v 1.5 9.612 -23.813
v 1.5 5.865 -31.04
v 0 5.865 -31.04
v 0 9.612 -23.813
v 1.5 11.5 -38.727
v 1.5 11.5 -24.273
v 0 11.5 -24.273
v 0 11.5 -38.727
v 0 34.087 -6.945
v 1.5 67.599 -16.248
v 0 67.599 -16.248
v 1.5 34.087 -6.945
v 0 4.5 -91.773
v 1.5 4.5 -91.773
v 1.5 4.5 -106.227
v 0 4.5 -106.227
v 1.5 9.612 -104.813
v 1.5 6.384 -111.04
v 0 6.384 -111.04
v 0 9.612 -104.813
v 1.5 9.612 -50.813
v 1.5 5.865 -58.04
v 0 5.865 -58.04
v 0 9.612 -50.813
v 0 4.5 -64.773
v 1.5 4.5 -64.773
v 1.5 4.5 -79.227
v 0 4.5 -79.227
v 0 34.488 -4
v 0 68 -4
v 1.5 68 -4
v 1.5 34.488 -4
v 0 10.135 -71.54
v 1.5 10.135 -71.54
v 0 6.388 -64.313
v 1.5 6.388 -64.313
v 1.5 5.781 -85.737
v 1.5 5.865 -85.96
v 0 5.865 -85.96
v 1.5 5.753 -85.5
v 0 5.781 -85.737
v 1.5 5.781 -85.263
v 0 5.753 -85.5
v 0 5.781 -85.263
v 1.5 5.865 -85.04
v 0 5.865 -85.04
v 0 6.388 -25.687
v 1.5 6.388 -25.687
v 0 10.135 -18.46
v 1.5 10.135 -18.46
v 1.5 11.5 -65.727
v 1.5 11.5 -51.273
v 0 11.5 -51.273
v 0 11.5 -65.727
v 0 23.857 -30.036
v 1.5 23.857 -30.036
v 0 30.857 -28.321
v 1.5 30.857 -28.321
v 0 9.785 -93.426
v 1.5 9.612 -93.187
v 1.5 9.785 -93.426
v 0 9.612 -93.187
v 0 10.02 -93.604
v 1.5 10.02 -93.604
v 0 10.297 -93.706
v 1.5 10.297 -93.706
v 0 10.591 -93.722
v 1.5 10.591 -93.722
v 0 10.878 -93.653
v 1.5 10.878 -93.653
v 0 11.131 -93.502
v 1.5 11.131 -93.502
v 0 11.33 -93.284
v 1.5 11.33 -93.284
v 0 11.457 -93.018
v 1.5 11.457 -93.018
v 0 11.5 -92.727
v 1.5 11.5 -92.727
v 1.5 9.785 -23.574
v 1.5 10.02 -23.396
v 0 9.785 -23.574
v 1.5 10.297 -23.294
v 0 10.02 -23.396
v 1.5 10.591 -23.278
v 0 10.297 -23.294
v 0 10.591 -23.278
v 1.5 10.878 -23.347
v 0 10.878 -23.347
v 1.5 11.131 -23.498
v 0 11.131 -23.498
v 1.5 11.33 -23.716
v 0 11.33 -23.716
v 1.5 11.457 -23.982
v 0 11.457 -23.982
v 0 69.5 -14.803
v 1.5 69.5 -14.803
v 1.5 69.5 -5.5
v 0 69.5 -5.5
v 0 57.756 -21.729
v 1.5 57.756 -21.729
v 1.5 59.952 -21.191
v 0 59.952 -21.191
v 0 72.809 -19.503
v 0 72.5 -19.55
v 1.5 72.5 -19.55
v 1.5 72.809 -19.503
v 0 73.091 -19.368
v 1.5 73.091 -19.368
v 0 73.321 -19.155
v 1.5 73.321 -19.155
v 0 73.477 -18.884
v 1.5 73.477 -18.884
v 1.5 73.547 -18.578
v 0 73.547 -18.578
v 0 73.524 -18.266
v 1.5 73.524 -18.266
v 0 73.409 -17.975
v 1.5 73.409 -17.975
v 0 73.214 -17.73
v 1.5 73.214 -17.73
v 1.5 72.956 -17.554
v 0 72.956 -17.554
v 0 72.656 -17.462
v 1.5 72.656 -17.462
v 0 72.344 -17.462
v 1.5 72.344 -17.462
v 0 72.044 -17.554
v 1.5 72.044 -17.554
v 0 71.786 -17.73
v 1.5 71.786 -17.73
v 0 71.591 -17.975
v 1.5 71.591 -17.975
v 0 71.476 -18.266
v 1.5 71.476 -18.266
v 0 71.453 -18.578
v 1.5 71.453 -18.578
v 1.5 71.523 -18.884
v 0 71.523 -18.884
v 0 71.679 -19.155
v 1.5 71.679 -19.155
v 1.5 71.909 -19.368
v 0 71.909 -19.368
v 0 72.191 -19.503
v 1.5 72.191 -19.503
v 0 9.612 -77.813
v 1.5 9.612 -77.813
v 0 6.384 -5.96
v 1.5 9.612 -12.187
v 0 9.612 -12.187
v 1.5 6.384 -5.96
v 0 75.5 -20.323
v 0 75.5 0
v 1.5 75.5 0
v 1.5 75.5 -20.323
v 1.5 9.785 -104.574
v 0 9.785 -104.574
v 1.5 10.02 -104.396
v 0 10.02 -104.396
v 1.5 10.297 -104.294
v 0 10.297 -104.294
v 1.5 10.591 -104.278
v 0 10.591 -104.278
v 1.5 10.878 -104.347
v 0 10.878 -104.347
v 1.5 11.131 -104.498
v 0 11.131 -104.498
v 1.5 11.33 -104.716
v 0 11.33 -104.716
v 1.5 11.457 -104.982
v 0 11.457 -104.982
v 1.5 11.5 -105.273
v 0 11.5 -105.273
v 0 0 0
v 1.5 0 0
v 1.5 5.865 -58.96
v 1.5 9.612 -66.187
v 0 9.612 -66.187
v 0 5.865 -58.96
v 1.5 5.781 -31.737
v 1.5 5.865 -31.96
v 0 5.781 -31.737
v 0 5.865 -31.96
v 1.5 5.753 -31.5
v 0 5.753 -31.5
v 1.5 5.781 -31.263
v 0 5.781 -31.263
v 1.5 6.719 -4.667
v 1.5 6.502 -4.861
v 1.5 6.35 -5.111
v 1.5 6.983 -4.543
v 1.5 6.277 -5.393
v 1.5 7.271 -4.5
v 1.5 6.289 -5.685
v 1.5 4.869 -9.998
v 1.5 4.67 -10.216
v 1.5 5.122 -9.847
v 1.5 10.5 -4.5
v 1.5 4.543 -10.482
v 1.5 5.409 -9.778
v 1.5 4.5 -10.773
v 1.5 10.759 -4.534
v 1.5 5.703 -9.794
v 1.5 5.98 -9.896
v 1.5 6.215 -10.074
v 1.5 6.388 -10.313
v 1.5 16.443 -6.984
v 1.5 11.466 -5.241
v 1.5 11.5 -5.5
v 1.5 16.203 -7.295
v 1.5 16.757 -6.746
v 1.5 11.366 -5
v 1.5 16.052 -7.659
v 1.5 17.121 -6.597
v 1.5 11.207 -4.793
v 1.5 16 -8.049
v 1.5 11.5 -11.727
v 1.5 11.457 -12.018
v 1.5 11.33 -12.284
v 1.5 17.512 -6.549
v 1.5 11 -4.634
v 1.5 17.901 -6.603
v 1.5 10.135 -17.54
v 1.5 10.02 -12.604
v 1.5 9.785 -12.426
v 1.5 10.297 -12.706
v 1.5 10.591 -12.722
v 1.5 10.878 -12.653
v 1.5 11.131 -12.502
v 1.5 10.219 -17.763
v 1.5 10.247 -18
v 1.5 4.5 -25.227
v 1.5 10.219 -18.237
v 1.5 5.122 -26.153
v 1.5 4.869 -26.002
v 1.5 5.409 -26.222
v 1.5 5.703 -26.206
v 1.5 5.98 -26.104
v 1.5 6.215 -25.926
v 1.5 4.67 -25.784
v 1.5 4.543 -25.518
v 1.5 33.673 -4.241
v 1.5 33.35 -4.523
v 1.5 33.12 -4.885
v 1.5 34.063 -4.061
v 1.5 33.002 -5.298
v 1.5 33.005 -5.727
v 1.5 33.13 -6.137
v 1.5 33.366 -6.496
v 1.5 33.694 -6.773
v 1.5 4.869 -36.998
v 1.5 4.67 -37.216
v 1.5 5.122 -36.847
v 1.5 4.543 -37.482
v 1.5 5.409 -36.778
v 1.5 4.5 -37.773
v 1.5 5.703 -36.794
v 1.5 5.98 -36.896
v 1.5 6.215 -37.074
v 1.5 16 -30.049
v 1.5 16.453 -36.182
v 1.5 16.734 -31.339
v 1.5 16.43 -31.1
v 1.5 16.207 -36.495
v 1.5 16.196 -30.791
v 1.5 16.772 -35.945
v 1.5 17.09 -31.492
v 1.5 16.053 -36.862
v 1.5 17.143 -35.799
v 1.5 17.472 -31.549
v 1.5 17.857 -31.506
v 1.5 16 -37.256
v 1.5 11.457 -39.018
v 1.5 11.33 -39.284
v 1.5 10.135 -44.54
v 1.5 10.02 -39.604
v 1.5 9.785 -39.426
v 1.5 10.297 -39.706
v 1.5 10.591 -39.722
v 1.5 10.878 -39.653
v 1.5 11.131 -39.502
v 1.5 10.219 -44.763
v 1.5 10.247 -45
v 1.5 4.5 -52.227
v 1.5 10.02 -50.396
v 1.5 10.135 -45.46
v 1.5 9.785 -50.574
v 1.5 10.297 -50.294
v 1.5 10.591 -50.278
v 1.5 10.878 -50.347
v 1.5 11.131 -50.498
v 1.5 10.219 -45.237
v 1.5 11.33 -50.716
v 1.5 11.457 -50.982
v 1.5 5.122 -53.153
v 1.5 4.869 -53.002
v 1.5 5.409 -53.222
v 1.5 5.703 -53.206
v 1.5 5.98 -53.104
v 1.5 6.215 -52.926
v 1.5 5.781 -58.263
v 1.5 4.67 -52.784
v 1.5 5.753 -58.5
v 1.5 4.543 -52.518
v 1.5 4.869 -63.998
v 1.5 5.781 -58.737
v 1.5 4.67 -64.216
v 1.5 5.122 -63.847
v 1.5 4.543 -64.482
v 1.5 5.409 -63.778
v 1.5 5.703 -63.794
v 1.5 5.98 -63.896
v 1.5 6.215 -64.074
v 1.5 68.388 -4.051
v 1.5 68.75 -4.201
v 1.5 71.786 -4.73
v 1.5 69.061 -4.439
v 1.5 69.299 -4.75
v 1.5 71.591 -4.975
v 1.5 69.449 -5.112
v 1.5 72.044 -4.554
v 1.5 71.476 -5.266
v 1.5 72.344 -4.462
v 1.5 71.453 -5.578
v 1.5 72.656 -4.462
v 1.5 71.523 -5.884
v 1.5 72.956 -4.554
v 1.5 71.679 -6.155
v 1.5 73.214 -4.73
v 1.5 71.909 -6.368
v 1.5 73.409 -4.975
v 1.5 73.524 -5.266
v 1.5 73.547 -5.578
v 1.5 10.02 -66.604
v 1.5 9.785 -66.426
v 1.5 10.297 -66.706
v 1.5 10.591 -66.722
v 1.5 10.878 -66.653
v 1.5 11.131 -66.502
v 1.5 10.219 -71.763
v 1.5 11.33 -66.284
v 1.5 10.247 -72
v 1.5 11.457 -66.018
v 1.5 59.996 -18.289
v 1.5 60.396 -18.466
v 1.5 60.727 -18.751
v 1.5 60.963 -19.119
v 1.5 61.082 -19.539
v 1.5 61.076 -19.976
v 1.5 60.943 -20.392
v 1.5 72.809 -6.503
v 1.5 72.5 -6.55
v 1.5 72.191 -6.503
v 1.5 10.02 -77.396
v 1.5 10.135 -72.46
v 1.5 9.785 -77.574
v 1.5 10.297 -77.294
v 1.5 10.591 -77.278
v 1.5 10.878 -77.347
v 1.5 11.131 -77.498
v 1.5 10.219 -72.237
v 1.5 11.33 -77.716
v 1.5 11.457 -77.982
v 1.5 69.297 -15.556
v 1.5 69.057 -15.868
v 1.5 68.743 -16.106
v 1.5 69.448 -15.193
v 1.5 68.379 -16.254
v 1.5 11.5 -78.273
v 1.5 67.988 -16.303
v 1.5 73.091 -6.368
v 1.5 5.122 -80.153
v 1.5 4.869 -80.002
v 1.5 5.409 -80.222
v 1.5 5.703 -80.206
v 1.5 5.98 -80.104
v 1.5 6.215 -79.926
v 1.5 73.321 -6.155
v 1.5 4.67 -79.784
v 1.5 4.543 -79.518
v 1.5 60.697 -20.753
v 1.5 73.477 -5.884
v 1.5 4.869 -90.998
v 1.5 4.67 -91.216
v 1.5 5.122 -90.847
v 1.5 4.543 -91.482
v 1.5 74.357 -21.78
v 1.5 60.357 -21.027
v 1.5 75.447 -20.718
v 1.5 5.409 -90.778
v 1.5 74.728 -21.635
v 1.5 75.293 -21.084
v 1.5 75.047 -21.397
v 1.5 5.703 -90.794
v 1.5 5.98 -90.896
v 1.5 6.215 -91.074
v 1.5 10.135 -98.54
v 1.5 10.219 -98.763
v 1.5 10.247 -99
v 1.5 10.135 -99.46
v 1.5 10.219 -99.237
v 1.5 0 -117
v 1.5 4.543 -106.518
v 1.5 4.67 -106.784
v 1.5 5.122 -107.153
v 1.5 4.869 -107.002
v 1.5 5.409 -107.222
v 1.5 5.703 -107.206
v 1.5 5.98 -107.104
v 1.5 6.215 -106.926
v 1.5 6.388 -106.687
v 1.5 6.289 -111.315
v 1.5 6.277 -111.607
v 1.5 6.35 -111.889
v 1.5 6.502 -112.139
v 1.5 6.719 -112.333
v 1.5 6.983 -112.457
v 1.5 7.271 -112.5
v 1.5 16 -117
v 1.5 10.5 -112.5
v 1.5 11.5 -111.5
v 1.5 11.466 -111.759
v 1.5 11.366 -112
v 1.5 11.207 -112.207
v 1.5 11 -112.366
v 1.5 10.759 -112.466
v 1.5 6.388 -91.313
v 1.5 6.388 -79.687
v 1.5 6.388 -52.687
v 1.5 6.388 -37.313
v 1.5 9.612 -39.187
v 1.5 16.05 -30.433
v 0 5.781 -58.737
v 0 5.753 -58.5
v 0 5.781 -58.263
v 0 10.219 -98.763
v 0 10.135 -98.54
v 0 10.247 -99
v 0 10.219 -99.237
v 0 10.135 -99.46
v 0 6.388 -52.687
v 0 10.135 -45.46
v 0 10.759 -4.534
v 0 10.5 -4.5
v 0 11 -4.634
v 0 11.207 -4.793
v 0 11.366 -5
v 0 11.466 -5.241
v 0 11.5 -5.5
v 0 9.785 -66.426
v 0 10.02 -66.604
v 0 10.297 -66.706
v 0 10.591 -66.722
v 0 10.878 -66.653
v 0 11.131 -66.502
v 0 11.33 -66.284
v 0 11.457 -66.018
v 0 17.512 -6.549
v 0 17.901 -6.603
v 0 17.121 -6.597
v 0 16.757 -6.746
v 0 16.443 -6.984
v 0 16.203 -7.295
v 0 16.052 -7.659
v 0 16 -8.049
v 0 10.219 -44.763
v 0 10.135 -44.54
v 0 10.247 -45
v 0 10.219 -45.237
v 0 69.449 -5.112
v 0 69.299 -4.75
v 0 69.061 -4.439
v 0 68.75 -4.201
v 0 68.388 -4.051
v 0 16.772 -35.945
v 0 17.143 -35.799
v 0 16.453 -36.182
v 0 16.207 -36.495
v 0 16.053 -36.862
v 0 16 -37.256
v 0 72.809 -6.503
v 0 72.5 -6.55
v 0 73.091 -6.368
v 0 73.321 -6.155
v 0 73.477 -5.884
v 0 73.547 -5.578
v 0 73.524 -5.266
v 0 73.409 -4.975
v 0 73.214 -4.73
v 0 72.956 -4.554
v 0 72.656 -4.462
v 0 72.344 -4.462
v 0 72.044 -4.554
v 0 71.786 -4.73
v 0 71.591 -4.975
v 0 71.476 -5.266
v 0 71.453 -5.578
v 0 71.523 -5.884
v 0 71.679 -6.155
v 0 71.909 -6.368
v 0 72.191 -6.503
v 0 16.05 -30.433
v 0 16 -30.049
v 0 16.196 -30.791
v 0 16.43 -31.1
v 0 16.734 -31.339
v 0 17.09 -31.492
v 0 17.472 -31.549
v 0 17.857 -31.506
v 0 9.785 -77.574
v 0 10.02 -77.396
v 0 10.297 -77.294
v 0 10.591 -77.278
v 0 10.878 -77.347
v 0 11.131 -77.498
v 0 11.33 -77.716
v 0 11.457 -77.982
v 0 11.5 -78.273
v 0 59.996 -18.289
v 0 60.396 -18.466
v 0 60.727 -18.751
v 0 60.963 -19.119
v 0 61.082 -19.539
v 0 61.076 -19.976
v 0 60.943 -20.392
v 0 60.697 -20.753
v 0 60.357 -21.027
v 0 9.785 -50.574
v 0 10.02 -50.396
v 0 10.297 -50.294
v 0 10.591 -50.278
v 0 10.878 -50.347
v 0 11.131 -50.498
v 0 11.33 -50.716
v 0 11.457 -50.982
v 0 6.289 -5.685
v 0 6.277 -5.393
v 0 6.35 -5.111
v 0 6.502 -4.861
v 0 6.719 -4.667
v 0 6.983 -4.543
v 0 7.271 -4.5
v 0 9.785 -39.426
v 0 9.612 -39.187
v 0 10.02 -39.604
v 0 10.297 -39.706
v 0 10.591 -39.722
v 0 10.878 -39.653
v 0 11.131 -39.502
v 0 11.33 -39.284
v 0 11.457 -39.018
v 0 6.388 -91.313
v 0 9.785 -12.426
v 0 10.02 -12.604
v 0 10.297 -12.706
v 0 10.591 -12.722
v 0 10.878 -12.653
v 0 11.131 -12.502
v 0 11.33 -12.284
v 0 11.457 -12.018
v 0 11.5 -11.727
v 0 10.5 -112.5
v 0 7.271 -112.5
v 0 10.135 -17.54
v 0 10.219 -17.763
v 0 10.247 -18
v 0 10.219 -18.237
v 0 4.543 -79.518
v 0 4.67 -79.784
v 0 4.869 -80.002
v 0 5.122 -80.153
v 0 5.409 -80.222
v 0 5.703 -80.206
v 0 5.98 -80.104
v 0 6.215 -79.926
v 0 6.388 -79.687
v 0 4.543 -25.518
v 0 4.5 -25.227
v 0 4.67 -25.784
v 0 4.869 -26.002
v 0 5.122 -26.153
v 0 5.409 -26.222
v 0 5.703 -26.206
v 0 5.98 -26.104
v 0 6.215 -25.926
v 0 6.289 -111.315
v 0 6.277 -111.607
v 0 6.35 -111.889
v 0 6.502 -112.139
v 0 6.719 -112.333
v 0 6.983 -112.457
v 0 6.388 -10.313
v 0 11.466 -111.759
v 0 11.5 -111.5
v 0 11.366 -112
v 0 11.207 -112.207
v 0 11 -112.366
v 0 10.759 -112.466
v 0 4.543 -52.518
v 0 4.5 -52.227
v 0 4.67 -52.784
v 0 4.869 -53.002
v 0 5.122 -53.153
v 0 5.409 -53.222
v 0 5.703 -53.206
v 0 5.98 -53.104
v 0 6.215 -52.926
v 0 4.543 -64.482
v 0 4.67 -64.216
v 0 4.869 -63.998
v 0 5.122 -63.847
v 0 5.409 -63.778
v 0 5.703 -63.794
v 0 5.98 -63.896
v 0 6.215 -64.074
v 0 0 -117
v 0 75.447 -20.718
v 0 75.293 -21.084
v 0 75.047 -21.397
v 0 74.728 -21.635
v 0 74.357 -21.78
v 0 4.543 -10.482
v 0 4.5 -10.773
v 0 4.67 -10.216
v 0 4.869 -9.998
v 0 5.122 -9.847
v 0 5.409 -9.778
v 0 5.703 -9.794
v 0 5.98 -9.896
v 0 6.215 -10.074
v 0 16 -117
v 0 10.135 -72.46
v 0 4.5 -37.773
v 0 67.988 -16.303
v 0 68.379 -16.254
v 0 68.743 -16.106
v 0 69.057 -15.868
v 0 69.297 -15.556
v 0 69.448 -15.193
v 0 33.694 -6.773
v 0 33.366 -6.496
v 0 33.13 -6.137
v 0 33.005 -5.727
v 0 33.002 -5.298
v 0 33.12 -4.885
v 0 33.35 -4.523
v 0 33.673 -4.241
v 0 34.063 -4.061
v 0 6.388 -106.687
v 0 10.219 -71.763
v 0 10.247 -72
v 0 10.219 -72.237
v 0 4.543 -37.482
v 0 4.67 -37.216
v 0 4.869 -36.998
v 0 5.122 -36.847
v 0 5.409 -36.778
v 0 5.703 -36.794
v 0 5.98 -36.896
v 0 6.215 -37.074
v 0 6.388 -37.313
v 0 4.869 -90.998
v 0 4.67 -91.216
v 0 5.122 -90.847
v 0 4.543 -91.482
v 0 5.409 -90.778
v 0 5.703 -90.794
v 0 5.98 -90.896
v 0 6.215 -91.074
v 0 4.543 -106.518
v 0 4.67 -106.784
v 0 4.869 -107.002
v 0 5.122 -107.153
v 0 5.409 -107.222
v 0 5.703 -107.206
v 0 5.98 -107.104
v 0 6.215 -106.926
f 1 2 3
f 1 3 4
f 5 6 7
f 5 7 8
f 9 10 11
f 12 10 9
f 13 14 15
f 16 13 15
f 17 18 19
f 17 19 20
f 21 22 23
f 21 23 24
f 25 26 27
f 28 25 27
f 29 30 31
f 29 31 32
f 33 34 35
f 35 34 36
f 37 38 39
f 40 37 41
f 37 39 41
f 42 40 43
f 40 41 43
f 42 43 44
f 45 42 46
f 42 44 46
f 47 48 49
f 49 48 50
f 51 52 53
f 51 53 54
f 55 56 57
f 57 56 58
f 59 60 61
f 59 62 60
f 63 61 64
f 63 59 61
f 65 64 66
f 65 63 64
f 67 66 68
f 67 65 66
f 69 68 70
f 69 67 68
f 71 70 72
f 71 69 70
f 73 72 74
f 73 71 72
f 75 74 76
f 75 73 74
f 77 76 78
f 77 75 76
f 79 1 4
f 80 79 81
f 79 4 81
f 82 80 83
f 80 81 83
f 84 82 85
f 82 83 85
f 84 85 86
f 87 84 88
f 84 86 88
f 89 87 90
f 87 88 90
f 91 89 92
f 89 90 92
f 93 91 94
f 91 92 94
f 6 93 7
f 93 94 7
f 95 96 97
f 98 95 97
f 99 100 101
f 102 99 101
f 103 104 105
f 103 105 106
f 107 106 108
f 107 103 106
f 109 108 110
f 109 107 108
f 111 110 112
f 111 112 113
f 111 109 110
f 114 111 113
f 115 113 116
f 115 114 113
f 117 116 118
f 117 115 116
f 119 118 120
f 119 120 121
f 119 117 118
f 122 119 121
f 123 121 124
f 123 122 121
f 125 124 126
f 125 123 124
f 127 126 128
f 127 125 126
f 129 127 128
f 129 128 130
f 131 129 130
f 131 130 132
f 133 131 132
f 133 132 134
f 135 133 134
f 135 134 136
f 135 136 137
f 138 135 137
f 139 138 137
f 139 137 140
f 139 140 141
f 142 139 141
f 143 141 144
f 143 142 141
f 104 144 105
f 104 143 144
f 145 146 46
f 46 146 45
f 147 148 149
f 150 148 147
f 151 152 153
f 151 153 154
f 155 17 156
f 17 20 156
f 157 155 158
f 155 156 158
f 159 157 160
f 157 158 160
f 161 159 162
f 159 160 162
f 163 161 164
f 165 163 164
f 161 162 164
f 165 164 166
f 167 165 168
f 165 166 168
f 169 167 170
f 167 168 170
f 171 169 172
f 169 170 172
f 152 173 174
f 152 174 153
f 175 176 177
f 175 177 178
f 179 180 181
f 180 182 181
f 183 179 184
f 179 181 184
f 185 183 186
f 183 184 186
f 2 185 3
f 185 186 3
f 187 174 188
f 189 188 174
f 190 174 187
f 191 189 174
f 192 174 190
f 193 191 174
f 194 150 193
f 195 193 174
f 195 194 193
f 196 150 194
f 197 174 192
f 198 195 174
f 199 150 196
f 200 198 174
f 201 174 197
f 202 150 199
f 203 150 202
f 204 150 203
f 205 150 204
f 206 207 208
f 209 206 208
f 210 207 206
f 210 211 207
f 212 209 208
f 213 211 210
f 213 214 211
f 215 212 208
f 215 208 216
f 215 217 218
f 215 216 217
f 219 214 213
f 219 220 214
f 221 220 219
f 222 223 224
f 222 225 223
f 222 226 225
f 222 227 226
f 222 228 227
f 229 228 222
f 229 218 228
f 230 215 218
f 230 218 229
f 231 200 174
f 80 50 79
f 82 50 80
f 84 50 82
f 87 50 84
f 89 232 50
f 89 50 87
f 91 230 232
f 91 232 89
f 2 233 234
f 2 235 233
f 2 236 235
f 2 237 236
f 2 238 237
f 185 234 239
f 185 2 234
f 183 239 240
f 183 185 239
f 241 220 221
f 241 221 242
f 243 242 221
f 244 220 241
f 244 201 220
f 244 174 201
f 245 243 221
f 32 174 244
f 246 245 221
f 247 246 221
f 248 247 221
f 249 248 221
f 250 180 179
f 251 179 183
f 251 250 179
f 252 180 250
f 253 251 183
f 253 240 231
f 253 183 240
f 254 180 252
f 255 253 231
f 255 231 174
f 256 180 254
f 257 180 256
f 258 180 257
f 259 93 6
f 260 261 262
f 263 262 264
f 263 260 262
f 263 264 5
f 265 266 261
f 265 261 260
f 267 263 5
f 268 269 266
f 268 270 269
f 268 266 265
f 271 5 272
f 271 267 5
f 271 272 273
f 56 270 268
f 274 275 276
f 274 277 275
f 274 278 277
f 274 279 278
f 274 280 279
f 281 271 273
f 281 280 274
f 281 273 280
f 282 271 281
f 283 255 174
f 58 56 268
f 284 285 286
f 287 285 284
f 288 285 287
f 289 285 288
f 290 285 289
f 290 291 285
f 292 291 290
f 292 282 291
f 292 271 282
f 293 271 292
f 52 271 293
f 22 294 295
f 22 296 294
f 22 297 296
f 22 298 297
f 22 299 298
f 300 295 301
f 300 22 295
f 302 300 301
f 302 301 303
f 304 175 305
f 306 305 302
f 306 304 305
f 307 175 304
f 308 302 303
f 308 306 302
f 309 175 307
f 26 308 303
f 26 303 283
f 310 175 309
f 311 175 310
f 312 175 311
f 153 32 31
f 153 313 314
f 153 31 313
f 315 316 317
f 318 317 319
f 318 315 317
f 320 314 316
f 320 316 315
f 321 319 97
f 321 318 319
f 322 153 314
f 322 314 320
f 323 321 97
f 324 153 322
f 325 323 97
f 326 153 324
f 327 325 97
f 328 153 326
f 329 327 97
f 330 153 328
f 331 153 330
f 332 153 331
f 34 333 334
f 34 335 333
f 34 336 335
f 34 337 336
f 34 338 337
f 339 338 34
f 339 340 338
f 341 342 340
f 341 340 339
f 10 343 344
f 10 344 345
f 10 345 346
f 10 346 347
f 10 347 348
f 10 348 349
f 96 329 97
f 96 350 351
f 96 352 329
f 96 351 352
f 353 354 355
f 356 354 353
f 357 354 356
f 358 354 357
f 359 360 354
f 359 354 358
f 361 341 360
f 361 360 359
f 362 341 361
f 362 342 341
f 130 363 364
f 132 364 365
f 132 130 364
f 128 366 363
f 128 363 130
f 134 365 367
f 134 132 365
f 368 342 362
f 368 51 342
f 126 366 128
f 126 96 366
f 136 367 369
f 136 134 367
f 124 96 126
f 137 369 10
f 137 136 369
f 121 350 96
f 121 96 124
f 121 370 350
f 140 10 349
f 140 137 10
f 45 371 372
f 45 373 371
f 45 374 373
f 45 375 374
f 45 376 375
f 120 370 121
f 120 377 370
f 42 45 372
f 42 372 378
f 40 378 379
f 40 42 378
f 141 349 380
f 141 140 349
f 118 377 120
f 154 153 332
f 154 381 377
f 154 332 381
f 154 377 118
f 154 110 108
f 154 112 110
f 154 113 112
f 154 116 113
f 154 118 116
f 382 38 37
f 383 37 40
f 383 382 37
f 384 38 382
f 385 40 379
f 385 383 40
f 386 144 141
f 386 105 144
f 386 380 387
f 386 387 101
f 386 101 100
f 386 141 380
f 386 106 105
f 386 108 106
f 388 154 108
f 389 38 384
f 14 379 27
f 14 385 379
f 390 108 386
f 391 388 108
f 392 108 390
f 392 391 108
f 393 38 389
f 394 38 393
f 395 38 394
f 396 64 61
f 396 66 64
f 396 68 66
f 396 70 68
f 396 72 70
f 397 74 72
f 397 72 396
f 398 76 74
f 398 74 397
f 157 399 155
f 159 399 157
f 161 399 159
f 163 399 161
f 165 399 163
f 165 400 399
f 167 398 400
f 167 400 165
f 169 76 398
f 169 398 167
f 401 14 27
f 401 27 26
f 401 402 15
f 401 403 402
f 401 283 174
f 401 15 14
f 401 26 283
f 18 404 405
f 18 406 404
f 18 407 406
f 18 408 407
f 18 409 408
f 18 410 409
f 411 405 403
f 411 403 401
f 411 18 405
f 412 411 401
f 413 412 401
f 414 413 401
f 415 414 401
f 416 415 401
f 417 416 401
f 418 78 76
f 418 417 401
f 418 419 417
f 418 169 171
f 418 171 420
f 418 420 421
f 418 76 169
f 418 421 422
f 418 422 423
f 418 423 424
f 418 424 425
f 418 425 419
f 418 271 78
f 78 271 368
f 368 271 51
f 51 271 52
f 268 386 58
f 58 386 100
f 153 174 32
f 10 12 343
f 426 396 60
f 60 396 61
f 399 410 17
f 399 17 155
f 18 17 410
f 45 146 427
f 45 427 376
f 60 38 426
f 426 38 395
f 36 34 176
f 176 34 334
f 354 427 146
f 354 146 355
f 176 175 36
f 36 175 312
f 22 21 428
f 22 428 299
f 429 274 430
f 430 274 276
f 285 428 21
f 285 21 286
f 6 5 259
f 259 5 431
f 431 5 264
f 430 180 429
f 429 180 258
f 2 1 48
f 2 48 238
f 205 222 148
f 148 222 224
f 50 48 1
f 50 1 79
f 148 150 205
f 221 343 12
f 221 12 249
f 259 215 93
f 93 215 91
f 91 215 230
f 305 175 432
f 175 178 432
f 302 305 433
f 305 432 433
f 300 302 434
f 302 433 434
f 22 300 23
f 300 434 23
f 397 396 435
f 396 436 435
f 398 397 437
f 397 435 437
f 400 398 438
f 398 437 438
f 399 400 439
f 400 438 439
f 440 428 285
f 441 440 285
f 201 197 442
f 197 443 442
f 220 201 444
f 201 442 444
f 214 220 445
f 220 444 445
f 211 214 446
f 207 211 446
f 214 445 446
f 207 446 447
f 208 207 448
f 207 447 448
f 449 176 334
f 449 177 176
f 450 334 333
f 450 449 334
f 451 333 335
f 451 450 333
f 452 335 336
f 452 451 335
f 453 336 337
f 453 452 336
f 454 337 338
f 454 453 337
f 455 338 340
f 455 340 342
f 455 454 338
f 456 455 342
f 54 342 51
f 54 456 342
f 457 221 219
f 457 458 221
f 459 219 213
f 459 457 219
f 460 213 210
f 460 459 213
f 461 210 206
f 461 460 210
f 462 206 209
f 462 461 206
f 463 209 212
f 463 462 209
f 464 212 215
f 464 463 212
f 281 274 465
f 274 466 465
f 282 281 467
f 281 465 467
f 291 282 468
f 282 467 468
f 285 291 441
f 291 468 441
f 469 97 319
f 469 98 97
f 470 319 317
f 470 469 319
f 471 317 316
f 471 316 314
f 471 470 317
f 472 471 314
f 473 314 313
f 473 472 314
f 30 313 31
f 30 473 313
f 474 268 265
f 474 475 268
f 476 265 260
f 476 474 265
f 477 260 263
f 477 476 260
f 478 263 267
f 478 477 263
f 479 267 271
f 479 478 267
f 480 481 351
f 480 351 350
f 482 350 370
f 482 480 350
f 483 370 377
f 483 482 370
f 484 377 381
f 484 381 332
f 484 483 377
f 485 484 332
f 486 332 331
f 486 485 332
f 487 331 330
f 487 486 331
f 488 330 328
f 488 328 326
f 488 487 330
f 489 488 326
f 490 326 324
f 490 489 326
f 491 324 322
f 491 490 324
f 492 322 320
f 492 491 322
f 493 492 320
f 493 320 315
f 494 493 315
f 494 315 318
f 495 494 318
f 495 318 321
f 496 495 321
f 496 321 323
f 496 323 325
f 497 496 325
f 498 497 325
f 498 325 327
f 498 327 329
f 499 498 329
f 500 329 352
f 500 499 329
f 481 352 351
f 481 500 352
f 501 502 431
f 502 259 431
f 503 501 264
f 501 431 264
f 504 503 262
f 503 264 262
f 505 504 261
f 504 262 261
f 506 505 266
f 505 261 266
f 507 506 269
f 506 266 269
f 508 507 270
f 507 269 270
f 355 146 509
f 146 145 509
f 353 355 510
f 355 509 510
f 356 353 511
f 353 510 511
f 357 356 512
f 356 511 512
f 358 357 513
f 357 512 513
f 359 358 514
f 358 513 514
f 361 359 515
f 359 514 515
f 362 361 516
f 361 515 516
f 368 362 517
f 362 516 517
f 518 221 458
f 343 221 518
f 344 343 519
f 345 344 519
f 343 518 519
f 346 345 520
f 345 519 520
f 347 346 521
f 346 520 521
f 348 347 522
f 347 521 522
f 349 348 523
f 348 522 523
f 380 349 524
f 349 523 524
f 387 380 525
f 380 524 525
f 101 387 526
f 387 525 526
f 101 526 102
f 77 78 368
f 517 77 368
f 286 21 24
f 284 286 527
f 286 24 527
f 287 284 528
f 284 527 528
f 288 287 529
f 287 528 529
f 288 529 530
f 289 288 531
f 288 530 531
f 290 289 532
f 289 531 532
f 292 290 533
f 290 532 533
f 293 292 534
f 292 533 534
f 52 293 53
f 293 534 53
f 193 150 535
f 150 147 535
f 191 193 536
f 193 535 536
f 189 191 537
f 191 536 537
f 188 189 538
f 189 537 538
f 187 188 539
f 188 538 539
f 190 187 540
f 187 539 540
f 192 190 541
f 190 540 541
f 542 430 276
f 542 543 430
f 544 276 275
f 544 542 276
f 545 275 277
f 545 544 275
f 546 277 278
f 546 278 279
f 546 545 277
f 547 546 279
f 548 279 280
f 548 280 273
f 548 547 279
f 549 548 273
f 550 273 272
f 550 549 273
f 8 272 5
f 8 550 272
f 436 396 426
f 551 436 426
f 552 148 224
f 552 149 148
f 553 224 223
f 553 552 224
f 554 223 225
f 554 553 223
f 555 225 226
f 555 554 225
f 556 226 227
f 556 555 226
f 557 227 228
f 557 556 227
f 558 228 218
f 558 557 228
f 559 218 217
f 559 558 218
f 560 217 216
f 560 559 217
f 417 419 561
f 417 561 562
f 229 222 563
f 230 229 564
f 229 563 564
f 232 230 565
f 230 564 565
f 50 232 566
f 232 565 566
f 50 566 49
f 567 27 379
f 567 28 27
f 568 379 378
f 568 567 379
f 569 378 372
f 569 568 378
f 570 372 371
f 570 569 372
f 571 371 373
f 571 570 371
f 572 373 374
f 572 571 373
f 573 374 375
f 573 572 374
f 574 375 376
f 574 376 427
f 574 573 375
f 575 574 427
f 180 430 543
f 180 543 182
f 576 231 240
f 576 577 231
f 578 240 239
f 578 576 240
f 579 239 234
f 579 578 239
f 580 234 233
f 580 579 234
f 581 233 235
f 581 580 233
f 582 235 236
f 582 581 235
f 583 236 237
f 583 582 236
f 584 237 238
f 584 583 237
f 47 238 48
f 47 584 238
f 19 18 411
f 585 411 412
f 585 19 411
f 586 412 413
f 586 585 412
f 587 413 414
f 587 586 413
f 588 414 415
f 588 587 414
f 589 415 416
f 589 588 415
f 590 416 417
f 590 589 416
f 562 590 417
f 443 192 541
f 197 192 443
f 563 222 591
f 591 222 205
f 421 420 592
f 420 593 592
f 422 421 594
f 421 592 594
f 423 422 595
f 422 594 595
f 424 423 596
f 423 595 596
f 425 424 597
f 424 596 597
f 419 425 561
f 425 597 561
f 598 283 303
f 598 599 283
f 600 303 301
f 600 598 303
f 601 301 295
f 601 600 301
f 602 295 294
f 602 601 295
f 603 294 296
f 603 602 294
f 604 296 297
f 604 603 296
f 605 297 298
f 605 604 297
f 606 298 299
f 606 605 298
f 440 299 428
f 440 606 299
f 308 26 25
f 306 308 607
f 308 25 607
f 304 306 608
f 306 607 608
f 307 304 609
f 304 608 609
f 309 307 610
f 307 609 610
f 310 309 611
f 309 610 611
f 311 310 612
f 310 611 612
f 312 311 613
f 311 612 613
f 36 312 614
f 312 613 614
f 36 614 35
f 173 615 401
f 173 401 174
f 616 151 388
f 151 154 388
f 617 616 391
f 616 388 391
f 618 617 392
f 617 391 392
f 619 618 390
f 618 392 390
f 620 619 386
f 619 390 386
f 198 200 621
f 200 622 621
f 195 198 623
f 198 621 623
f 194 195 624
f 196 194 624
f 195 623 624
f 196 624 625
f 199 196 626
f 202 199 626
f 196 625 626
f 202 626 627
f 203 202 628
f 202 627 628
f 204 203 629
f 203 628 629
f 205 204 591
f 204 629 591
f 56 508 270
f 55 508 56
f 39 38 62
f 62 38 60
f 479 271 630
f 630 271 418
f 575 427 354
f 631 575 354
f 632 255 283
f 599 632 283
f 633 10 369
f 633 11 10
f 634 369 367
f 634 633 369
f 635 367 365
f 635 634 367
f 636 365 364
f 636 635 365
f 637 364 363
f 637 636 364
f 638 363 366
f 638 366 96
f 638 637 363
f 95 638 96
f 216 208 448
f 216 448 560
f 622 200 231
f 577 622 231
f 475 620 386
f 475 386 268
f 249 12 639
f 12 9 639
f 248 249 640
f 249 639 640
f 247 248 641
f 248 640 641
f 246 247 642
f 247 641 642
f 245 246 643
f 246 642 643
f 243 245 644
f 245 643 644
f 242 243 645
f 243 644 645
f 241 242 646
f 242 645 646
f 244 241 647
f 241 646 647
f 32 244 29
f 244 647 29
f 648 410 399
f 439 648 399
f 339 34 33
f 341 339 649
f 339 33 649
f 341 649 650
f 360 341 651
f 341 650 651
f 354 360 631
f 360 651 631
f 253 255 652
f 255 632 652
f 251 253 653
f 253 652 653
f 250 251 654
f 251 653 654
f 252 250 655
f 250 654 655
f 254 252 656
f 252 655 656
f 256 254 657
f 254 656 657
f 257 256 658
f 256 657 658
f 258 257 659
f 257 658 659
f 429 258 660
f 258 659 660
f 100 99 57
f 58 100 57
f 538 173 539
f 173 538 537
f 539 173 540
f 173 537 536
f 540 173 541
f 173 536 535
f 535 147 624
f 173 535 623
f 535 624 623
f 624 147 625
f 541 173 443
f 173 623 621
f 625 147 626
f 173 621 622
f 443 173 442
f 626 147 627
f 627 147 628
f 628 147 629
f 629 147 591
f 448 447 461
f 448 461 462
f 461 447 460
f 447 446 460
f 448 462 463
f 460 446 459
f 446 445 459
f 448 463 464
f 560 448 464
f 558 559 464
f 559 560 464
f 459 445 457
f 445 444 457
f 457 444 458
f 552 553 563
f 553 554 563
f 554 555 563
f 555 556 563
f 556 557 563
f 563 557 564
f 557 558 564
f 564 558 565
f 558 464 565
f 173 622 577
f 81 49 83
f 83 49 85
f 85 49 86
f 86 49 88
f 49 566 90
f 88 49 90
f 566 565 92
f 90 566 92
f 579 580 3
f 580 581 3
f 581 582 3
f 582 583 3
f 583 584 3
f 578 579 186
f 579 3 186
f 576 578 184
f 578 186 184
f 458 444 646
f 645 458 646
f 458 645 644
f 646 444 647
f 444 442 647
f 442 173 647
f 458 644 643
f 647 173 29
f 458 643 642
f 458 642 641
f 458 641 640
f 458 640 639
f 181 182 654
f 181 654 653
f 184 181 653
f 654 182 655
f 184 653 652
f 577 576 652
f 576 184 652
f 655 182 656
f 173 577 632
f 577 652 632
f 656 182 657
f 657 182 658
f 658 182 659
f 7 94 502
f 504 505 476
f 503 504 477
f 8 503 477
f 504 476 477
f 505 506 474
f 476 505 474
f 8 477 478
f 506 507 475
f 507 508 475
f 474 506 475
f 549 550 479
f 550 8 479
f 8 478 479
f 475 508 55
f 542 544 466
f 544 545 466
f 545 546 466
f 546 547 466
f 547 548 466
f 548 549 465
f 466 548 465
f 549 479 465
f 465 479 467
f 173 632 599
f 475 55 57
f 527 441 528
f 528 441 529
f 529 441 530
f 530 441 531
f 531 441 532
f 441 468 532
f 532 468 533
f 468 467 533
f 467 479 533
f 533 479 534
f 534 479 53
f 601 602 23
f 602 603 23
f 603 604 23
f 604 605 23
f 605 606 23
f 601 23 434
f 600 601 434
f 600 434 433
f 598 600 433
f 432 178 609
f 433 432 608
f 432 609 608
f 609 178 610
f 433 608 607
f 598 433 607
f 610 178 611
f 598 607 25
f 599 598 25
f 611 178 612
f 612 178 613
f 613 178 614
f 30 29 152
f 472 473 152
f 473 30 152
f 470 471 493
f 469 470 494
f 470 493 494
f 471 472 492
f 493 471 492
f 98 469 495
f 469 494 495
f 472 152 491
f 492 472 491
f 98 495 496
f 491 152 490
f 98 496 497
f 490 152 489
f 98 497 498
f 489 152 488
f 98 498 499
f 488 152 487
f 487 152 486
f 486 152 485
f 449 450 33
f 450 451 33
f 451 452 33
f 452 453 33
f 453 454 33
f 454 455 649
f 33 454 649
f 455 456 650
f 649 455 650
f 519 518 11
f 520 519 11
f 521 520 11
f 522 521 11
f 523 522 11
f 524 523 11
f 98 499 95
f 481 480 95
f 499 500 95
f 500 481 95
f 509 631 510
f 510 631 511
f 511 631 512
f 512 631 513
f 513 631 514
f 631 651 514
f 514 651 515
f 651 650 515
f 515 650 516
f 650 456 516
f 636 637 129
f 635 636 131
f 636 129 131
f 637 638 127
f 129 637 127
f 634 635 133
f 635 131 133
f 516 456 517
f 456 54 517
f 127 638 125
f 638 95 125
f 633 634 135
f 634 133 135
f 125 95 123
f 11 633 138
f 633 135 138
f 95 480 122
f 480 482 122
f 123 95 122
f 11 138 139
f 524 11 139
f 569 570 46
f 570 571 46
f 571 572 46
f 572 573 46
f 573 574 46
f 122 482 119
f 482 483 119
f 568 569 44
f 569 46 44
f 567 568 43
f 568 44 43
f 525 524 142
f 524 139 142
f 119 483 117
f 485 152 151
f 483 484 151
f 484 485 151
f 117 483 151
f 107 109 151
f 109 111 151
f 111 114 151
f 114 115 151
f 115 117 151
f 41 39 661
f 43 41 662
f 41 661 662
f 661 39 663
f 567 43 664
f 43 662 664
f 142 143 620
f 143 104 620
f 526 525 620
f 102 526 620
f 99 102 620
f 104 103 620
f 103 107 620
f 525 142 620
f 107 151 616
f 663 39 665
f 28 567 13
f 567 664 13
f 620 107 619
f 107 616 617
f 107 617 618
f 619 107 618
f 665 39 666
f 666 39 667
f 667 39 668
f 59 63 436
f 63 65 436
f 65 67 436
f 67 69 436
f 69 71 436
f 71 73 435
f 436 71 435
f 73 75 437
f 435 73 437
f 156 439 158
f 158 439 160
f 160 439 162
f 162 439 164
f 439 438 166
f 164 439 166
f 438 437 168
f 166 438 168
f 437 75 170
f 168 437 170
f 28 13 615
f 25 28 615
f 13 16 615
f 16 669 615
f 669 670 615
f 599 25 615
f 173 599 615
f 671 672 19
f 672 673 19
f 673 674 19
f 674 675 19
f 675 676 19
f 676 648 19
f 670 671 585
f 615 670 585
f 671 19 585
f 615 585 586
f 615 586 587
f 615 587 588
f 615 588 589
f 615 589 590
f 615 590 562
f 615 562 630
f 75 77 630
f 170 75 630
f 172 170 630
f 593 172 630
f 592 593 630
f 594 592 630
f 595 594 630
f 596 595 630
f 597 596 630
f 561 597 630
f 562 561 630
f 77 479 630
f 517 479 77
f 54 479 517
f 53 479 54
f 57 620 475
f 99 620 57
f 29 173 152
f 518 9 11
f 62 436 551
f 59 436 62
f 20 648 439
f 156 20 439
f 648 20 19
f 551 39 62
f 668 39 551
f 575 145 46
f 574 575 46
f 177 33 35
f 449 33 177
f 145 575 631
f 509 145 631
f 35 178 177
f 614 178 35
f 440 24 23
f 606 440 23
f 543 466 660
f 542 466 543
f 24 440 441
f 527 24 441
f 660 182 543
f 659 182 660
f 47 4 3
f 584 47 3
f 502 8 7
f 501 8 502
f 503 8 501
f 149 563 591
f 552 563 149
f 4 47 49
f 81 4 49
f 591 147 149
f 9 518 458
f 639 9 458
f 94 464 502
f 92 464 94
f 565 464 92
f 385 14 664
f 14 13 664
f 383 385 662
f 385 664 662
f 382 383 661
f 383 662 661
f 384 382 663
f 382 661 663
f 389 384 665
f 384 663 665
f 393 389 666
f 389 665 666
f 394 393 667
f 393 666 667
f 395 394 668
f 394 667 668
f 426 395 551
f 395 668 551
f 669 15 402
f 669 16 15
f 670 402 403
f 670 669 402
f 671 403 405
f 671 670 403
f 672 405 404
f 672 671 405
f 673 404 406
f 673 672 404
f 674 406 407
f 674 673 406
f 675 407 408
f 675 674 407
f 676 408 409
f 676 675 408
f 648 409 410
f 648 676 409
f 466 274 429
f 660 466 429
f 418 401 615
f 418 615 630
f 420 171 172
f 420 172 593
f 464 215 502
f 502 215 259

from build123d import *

# Parameters (mm, degrees)
SKETCH1_R           = 1.05
BOSS_EXTRUDE1_DEPTH = 1.5
FILLET1_R           = 1.5
SKETCH2_W           = 117
SKETCH2_H           = 16
BOSS_EXTRUDE2_DEPTH = 1.5
CUT_EXTRUDE2_DEPTH  = 140.253366207
FILLET3_R           = 1
CUT_EXTRUDE3_DEPTH  = 140.253366207
BOSS_EXTRUDE3_DEPTH = 1.5
FILLET5_R           = 1.5


with BuildPart() as part:
    # Sketch1 → Boss-Extrude1 (new body)
    with BuildSketch(Plane(origin=(0, 0, 0), x_dir=(0, 0, -1), z_dir=(1, 0, 0))):
        Polygon((0, 0), (0, 75.5), (21.5, 75.5), (40, 0), (35.881667859, 0), (29.755840045, 25), (4, 25), (4, 0), align=None)
        with Locations((5.5, 72.5)):
            Circle(SKETCH1_R, mode=Mode.SUBTRACT)
        with Locations((18.5, 72.5)):
            Circle(SKETCH1_R, mode=Mode.SUBTRACT)
        Polygon((4, 69.5), (18.851866535, 69.5), (4, 29), align=None, mode=Mode.SUBTRACT)
        Polygon((8.260475549, 29), (20.558388216, 62.535546651), (28.775707595, 29), align=None, mode=Mode.SUBTRACT)
    extrude(amount=BOSS_EXTRUDE1_DEPTH)

    # Fillet1
    fillet1_edges = [part.edges().sort_by_distance(p)[0] for p in [
        (0.75, 75.5, -21.5),
        (0.75, 25, -29.755840045),
        (0.75, 25, -4),
        (0.75, 69.5, -4),
        (0.75, 29, -4),
        (0.75, 69.5, -18.851866535),
        (0.75, 29, -8.260475549),
        (0.75, 29, -28.775707595),
        (0.75, 62.535546651, -20.558388216),
    ]]
    fillet(fillet1_edges, radius=FILLET1_R)

    # Sketch2 → Boss-Extrude2 (add)
    with BuildSketch(Plane(origin=(1.5, 0, 0), x_dir=(0, 0, -1), z_dir=(1, 0, 0))):
        with Locations((58.5, 8)):
            Rectangle(SKETCH2_W, SKETCH2_H)
    extrude(amount=-BOSS_EXTRUDE2_DEPTH)

    # Sketch5 → Cut-Extrude2 (cut, through all)
    with BuildSketch(Plane(origin=(1.5, 0, 0), x_dir=(0, 0, -1), z_dir=(1, 0, 0))):
        Polygon((4.5, 11.5), (15.827584811, 11.5), (4.5, 5.626437506), align=None)
        Polygon((112.5, 11.5), (112.5, 5.626437506), (101.172415189, 11.5), align=None)
        Polygon((6.672415189, 4.5), (29.327584811, 4.5), (18, 10.373562494), align=None)
        Polygon((33.672415189, 4.5), (56.327584811, 4.5), (45, 10.373562494), align=None)
        Polygon((60.672415189, 4.5), (83.327584811, 4.5), (72, 10.373562494), align=None)
        Polygon((87.672415189, 4.5), (110.327584811, 4.5), (99, 10.373562494), align=None)
        Polygon((20.172415189, 11.5), (42.827584811, 11.5), (31.5, 5.626437506), align=None)
        Polygon((47.172415189, 11.5), (69.827584811, 11.5), (58.5, 5.626437506), align=None)
        Polygon((85.5, 5.626437506), (96.827584811, 11.5), (74.172415189, 11.5), align=None)
    extrude(amount=-CUT_EXTRUDE2_DEPTH, mode=Mode.SUBTRACT)

    # Fillet3
    fillet3_edges = [part.edges().sort_by_distance(p)[0] for p in [
        (0.75, 4.5, -56.327584811),
        (0.75, 4.5, -33.672415189),
        (0.75, 10.373562494, -45),
        (0.75, 5.626437506, -58.5),
        (0.75, 11.5, -47.172415189),
        (0.75, 11.5, -69.827584811),
        (0.75, 4.5, -29.327584811),
        (0.75, 4.5, -6.672415189),
        (0.75, 10.373562494, -18),
        (0.75, 5.626437506, -31.5),
        (0.75, 11.5, -20.172415189),
        (0.75, 11.5, -42.827584811),
        (0.75, 4.5, -110.327584811),
        (0.75, 4.5, -87.672415189),
        (0.75, 10.373562494, -99),
        (0.75, 5.626437506, -112.5),
        (0.75, 11.5, -101.172415189),
        (0.75, 11.5, -112.5),
        (0.75, 4.5, -83.327584811),
        (0.75, 4.5, -60.672415189),
        (0.75, 10.373562494, -72),
        (0.75, 5.626437506, -85.5),
        (0.75, 11.5, -74.172415189),
        (0.75, 11.5, -96.827584811),
        (0.75, 5.626437506, -4.5),
        (0.75, 11.5, -4.5),
        (0.75, 11.5, -15.827584811),
    ]]
    fillet(fillet3_edges, radius=FILLET3_R)

    # Sketch6 → Cut-Extrude3 (cut, through all)
    with BuildSketch(Plane(origin=(1.5, 0, 0), x_dir=(0, 0, -1), z_dir=(1, 0, 0))):
        Polygon((30.998526841, 19.928494428), (18.851866535, 69.5), (4, 69.5), (4, 19.75), align=None)
    extrude(amount=-CUT_EXTRUDE3_DEPTH, mode=Mode.SUBTRACT)

    # Sketch7 → Boss-Extrude3 (add)
    with BuildSketch(Plane(origin=(1.5, 0, 0), x_dir=(0, 0, -1), z_dir=(1, 0, 0))):
        Polygon((16.776232149, 69.5), (4, 23.476934928), (4, 16), (6.075634386, 16), (19.825004849, 65.528543637), (18.851866535, 69.5), align=None)
    extrude(amount=-BOSS_EXTRUDE3_DEPTH)

    # Fillet5
    fillet5_edges = [part.edges().sort_by_distance(p)[0] for p in [
        (0.75, 16, -31.961138058),
        (0.75, 16, -36.079470199),
        (0.75, 69.5, -4),
        (0.75, 69.5, -16.776232149),
        (0.75, 23.476934928, -4),
        (0.75, 16, -6.075634386),
        (0.75, 65.528543637, -19.825004849),
    ]]
    fillet(fillet5_edges, radius=FILLET5_R)


solid = part.part
